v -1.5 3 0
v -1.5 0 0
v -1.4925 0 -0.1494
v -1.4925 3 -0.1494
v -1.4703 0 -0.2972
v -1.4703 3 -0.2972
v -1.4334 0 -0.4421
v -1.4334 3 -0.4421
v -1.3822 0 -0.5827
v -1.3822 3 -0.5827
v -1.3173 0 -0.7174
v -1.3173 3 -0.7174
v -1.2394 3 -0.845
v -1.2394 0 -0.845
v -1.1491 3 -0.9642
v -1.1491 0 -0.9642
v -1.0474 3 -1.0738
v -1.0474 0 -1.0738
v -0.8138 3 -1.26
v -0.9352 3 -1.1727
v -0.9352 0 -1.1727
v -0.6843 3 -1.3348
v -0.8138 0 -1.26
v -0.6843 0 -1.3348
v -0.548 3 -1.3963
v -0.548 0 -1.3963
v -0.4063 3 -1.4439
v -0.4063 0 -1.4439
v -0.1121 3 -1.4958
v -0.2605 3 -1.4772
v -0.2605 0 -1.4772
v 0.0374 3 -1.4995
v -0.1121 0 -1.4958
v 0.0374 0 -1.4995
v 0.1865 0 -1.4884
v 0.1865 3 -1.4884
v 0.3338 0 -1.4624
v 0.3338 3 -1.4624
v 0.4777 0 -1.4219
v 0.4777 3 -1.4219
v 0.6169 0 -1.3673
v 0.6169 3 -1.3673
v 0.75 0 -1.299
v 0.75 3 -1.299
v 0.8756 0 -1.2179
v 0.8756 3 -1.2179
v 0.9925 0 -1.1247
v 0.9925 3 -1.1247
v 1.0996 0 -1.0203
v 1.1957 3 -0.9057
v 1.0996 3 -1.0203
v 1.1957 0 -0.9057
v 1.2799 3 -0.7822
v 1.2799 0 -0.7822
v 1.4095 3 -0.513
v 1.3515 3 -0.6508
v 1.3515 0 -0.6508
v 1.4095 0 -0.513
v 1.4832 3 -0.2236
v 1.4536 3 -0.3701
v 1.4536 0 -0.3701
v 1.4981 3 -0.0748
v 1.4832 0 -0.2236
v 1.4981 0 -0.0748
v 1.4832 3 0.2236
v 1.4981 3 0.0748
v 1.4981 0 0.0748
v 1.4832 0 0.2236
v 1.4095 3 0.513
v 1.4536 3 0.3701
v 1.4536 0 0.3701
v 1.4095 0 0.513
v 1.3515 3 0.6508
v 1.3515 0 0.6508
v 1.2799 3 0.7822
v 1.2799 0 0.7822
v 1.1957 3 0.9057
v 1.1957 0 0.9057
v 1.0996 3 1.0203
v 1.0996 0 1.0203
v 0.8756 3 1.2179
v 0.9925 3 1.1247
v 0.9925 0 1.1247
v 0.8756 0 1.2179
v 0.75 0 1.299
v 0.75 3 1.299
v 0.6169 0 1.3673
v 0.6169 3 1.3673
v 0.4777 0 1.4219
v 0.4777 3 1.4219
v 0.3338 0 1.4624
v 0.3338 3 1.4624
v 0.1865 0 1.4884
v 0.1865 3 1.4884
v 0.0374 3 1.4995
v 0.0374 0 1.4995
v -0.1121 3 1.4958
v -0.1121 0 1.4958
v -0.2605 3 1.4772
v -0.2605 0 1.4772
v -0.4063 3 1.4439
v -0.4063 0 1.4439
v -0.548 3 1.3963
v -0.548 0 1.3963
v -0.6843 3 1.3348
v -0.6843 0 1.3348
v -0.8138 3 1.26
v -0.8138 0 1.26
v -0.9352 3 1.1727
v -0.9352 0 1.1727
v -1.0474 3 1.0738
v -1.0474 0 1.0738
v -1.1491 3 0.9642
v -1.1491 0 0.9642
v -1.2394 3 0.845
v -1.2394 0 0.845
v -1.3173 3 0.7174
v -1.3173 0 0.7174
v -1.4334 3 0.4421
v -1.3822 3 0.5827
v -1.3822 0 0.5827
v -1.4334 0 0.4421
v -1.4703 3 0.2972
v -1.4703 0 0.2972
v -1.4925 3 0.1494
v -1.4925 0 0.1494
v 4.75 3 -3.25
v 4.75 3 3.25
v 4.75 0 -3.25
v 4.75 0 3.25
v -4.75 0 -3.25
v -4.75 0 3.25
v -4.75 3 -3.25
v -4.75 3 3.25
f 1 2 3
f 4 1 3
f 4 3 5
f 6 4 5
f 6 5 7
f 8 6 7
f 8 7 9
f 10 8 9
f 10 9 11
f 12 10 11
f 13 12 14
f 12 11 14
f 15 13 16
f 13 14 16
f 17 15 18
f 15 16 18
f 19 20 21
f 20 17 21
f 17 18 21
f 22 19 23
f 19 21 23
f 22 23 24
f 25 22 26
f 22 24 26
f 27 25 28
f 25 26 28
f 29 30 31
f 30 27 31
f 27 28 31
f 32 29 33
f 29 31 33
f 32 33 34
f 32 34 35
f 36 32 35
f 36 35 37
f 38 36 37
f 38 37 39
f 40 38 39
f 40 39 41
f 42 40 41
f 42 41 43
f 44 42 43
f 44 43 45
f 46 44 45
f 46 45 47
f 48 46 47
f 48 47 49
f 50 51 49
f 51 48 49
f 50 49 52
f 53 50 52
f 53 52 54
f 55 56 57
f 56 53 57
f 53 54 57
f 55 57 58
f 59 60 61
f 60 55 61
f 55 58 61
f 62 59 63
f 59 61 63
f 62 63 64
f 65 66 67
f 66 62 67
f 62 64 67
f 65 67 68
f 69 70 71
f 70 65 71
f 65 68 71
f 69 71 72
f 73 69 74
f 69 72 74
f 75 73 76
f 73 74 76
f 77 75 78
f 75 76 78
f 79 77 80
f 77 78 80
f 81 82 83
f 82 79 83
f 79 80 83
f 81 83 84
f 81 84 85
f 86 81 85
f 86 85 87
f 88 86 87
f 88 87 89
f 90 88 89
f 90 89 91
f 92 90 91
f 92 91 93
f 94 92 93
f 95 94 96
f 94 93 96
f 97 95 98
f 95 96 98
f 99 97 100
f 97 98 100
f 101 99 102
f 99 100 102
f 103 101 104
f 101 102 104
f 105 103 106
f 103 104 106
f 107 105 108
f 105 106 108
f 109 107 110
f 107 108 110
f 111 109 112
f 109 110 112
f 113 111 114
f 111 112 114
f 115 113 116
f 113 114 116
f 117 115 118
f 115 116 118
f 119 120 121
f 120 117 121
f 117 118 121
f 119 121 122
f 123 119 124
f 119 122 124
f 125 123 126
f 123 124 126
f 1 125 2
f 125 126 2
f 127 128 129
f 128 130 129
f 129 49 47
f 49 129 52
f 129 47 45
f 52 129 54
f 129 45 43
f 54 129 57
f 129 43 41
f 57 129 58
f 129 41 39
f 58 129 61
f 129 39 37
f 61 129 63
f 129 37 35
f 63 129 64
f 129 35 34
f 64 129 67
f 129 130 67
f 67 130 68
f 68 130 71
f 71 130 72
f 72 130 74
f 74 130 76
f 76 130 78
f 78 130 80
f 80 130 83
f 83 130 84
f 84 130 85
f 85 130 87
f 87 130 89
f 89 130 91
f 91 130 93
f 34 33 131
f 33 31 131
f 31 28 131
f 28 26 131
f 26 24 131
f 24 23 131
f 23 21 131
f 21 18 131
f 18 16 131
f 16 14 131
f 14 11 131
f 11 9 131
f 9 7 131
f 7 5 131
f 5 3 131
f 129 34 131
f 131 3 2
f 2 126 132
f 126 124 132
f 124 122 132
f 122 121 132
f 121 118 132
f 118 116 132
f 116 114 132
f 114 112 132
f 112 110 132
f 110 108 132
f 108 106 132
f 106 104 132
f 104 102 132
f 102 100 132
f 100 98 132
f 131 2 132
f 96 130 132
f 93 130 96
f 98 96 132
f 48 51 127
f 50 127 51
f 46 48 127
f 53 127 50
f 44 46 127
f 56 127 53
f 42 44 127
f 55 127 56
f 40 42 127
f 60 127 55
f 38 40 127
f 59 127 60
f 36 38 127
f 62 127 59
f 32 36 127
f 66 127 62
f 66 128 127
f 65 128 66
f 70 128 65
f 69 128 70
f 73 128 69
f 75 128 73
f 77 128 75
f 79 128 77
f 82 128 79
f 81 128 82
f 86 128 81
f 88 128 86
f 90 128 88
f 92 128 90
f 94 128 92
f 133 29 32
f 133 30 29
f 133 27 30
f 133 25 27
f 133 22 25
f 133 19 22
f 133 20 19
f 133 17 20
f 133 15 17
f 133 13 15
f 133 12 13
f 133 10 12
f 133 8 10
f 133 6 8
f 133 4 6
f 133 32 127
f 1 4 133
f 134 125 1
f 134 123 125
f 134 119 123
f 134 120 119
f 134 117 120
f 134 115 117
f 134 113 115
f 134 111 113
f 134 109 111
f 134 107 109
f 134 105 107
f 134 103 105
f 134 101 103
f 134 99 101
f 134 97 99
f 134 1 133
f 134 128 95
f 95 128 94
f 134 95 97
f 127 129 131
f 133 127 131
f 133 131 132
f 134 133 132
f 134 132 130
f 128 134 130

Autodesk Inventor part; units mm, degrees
ref_plane "YZ Plane" through (0, 0, 0) normal (1, 0, 0) x (0, 1, 0)
ref_plane "XZ Plane" through (0, 0, 0) normal (0, 1, 0) x (-1, 0, 0)
ref_plane "XY Plane" through (0, 0, 0) normal (0, 0, 1) x (1, 0, 0)
sketch "Sketch1" plane through (0, 0, 0) normal (0, 1, 0) x (-1, 0, 0)
  line L0 (4.75, 3.25) -> (-4.75, 3.25)
  line L1 (-4.75, 3.25) -> (-4.75, -3.25)
  line L2 (-4.75, -3.25) -> (4.75, -3.25)
  line L3 (4.75, -3.25) -> (4.75, 3.25)
  line L4 (4.75, 3.25) -> (-4.75, -3.25) construction
  line L5 (-4.75, 3.25) -> (4.75, -3.25) construction
  circle A0 centre (0, 0) radius 1.5
  dimension "d0" = 9.5
  dimension "d1" = 6.5
  dimension "d2" = 3
extrude "Extrusion1" add sketch "Sketch1" along normal blind 3
thread "Thread1" size "M3x0.5" class "6H" standard "ANSI Metric M Profile" full length
properties material "Brass, Soft Yellow, Welded"
